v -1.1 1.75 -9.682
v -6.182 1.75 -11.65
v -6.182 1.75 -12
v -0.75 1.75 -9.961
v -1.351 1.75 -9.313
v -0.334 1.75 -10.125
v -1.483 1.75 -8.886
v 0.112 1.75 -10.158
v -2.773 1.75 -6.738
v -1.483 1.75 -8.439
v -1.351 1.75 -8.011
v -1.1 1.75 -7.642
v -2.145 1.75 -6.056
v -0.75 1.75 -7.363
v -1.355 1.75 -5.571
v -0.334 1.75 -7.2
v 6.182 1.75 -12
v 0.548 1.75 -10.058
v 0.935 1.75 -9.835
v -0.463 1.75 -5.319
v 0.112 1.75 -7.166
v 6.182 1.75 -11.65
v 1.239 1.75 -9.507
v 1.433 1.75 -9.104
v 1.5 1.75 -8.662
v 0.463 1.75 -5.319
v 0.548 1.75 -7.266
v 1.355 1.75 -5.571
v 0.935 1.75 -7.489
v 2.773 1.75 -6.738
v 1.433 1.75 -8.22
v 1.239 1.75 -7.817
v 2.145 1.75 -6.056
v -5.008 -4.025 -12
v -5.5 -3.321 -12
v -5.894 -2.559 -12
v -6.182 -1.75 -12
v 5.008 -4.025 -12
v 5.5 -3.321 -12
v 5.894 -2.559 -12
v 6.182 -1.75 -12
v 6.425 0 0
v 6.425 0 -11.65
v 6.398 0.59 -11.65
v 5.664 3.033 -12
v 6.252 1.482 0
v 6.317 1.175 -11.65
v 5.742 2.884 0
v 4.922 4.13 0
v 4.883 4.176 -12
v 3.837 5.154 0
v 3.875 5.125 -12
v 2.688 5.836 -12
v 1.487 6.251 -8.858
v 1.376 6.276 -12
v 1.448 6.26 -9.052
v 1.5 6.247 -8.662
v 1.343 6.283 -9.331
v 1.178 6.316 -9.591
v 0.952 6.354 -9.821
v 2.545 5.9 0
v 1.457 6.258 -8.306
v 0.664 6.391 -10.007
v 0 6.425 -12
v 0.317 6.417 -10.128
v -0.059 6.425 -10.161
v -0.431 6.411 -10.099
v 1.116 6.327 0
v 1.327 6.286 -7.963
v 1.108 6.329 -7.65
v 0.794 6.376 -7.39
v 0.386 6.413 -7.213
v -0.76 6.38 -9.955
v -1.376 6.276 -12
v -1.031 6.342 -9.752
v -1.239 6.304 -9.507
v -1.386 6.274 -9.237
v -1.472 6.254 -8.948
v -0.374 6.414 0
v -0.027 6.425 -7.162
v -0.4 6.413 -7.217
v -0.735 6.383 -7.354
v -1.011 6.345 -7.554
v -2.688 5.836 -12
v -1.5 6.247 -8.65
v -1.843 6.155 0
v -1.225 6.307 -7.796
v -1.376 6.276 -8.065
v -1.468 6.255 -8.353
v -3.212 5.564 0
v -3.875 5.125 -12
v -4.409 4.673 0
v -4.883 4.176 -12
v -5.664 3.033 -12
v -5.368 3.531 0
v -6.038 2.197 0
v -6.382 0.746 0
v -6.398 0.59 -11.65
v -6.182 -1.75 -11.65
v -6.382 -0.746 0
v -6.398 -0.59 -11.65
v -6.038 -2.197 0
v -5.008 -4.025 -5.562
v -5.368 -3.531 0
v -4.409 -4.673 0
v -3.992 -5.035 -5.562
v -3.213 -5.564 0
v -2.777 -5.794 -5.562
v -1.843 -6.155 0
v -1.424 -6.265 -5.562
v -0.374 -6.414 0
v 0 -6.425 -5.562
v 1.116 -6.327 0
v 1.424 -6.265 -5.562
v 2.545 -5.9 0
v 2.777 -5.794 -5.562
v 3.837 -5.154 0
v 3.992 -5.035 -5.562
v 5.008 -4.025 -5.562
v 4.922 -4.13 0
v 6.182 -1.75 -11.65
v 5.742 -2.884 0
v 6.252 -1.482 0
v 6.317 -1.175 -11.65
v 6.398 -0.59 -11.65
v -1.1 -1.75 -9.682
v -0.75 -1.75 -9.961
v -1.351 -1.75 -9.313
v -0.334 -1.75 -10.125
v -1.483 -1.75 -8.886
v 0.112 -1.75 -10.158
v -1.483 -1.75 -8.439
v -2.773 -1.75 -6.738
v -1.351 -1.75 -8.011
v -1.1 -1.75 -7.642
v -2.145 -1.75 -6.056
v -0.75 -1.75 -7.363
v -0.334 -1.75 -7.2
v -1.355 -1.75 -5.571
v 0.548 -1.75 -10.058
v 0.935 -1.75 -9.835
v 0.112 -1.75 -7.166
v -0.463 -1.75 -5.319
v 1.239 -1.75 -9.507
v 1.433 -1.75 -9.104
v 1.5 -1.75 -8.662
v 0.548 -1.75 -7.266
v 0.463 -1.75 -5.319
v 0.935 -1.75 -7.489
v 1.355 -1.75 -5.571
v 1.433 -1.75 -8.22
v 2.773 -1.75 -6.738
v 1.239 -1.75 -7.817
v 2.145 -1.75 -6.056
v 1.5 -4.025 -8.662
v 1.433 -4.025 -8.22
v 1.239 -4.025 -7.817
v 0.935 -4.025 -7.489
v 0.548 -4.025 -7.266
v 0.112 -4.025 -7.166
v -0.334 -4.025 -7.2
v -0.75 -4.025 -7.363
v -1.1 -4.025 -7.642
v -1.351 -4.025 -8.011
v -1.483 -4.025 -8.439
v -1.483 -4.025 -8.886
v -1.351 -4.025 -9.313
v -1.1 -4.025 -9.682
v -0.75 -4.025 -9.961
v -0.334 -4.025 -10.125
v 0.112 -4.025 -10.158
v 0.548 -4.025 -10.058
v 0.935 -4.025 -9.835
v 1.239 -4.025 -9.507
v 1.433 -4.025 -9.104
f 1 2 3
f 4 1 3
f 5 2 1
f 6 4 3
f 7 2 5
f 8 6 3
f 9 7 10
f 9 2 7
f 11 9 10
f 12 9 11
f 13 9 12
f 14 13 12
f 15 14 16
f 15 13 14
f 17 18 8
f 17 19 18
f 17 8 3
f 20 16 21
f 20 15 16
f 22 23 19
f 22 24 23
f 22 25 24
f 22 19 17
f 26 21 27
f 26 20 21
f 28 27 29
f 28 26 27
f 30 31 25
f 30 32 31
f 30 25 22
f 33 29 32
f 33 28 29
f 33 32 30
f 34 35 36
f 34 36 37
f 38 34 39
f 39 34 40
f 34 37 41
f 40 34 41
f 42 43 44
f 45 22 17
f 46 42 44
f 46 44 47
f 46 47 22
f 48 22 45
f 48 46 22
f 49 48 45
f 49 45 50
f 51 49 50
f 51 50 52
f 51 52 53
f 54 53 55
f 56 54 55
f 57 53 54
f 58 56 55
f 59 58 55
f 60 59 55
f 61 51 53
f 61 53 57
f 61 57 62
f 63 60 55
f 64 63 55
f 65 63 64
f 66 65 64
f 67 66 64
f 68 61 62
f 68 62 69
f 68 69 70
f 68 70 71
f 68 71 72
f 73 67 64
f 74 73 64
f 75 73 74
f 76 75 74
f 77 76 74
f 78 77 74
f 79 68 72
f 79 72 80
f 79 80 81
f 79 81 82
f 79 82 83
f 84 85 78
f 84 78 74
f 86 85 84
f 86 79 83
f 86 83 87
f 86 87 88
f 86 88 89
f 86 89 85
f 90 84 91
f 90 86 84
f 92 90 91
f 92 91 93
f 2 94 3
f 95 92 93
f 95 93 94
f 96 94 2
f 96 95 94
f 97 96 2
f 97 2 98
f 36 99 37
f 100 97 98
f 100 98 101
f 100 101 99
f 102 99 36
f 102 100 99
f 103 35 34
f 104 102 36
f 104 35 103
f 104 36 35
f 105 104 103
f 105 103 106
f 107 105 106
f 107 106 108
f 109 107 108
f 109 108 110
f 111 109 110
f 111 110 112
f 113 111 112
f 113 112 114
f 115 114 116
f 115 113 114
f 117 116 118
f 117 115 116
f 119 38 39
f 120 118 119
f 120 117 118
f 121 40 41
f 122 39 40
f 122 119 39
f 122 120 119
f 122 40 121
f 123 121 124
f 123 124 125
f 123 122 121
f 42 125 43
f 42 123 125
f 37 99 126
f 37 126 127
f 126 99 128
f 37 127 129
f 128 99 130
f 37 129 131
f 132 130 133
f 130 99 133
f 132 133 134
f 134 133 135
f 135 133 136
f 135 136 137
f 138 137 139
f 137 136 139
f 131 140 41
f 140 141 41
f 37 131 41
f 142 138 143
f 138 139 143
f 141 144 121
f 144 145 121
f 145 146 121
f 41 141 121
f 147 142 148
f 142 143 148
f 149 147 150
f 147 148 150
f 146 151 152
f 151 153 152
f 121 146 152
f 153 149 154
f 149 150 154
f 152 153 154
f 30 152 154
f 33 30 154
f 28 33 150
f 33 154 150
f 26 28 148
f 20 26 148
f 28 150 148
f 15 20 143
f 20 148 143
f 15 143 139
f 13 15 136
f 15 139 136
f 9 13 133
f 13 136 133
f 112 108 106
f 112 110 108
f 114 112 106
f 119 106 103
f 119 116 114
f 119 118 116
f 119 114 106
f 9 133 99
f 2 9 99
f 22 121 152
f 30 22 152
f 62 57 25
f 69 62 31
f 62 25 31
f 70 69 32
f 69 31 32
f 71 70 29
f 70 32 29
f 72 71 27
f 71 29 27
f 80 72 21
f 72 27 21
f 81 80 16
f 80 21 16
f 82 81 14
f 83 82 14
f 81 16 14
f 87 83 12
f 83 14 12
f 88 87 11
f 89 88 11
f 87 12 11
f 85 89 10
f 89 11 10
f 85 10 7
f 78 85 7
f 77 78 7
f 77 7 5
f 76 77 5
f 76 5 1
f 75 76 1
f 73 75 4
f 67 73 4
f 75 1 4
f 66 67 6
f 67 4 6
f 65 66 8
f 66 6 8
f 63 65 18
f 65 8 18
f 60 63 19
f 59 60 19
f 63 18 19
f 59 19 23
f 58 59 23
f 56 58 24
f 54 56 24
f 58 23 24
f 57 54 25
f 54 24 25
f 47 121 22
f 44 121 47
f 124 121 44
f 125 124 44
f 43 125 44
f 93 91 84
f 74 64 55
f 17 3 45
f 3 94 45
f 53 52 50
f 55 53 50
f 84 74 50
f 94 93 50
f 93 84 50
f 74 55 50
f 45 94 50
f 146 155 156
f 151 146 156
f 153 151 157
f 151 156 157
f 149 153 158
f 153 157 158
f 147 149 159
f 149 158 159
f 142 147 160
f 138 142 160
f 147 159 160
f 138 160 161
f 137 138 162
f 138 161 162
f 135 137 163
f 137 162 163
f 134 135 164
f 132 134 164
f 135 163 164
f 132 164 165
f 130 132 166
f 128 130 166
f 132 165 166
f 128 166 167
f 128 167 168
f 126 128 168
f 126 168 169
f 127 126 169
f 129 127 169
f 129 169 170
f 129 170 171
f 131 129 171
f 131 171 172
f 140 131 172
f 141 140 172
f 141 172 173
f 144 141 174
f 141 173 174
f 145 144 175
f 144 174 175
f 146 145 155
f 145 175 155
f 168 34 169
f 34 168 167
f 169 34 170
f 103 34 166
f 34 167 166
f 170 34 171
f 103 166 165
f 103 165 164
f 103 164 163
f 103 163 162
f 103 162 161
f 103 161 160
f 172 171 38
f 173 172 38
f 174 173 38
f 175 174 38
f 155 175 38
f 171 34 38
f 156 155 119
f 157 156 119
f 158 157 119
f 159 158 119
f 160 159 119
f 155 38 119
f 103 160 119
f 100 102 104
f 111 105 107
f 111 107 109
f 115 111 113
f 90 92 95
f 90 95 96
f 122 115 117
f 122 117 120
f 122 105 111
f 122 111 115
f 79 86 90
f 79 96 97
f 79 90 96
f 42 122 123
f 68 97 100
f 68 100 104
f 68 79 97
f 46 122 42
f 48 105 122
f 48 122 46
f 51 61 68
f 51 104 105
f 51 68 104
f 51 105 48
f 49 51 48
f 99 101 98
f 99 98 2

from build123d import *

# Parameters (mm, degrees)
F0_R     = 6.425
F1_DEPTH = 12
F2_R     = 1.5
F3_DEPTH = 12.5
F5_DEPTH = 1.75
F6_W     = 3.5
F6_H     = 0.3499913151
F6_W_2   = 2.4
F6_H_2   = 1.6
F6_H_3   = 3
F6_H_4   = 1.8378814235
F7_DEPTH = 12.5


with BuildPart() as f1:
    # F0 (on Top) → F1 (new body)
    with BuildSketch(Plane.XY):
        Circle(F0_R)
    extrude(amount=-F1_DEPTH)

    # F2 (on Front) → F3 (cut, symmetric)
    with BuildSketch(Plane.XZ):
        with Locations((0, -8.6621185765)):
            Circle(F2_R)
    extrude(amount=F3_DEPTH, both=True, mode=Mode.SUBTRACT)

    # F4 (on Front) → F5 (cut, symmetric)
    with BuildSketch(Plane.XZ):
        with BuildLine():
            Line((6.425, -12), (2.7726078369, -6.7377301586))
            ThreePointArc((2.7726078369, -6.7377301586), (0, -5.2871185765), (-2.7726078369, -6.7377301586))
            Line((-2.7726078369, -6.7377301586), (-6.425, -12))
            Line((-6.425, -12), (6.425, -12))
        make_face()
    extrude(amount=F5_DEPTH, both=True, mode=Mode.SUBTRACT)

    # F6 (on Right) → F7 (cut, symmetric)
    with BuildSketch(Plane.YZ):
        with Locations((0, -11.8250043425)):
            Rectangle(F6_W, F6_H)
        with Locations((-5.225, -6.3621185765)):
            Rectangle(F6_W_2, F6_H_2)
        with Locations((-5.225, -8.6621185765)):
            Rectangle(F6_W_2, F6_H_3)
        with Locations((-5.225, -11.0810592882)):
            Rectangle(F6_W_2, F6_H_4)
    extrude(amount=F7_DEPTH, both=True, mode=Mode.SUBTRACT)


solid = f1.part
